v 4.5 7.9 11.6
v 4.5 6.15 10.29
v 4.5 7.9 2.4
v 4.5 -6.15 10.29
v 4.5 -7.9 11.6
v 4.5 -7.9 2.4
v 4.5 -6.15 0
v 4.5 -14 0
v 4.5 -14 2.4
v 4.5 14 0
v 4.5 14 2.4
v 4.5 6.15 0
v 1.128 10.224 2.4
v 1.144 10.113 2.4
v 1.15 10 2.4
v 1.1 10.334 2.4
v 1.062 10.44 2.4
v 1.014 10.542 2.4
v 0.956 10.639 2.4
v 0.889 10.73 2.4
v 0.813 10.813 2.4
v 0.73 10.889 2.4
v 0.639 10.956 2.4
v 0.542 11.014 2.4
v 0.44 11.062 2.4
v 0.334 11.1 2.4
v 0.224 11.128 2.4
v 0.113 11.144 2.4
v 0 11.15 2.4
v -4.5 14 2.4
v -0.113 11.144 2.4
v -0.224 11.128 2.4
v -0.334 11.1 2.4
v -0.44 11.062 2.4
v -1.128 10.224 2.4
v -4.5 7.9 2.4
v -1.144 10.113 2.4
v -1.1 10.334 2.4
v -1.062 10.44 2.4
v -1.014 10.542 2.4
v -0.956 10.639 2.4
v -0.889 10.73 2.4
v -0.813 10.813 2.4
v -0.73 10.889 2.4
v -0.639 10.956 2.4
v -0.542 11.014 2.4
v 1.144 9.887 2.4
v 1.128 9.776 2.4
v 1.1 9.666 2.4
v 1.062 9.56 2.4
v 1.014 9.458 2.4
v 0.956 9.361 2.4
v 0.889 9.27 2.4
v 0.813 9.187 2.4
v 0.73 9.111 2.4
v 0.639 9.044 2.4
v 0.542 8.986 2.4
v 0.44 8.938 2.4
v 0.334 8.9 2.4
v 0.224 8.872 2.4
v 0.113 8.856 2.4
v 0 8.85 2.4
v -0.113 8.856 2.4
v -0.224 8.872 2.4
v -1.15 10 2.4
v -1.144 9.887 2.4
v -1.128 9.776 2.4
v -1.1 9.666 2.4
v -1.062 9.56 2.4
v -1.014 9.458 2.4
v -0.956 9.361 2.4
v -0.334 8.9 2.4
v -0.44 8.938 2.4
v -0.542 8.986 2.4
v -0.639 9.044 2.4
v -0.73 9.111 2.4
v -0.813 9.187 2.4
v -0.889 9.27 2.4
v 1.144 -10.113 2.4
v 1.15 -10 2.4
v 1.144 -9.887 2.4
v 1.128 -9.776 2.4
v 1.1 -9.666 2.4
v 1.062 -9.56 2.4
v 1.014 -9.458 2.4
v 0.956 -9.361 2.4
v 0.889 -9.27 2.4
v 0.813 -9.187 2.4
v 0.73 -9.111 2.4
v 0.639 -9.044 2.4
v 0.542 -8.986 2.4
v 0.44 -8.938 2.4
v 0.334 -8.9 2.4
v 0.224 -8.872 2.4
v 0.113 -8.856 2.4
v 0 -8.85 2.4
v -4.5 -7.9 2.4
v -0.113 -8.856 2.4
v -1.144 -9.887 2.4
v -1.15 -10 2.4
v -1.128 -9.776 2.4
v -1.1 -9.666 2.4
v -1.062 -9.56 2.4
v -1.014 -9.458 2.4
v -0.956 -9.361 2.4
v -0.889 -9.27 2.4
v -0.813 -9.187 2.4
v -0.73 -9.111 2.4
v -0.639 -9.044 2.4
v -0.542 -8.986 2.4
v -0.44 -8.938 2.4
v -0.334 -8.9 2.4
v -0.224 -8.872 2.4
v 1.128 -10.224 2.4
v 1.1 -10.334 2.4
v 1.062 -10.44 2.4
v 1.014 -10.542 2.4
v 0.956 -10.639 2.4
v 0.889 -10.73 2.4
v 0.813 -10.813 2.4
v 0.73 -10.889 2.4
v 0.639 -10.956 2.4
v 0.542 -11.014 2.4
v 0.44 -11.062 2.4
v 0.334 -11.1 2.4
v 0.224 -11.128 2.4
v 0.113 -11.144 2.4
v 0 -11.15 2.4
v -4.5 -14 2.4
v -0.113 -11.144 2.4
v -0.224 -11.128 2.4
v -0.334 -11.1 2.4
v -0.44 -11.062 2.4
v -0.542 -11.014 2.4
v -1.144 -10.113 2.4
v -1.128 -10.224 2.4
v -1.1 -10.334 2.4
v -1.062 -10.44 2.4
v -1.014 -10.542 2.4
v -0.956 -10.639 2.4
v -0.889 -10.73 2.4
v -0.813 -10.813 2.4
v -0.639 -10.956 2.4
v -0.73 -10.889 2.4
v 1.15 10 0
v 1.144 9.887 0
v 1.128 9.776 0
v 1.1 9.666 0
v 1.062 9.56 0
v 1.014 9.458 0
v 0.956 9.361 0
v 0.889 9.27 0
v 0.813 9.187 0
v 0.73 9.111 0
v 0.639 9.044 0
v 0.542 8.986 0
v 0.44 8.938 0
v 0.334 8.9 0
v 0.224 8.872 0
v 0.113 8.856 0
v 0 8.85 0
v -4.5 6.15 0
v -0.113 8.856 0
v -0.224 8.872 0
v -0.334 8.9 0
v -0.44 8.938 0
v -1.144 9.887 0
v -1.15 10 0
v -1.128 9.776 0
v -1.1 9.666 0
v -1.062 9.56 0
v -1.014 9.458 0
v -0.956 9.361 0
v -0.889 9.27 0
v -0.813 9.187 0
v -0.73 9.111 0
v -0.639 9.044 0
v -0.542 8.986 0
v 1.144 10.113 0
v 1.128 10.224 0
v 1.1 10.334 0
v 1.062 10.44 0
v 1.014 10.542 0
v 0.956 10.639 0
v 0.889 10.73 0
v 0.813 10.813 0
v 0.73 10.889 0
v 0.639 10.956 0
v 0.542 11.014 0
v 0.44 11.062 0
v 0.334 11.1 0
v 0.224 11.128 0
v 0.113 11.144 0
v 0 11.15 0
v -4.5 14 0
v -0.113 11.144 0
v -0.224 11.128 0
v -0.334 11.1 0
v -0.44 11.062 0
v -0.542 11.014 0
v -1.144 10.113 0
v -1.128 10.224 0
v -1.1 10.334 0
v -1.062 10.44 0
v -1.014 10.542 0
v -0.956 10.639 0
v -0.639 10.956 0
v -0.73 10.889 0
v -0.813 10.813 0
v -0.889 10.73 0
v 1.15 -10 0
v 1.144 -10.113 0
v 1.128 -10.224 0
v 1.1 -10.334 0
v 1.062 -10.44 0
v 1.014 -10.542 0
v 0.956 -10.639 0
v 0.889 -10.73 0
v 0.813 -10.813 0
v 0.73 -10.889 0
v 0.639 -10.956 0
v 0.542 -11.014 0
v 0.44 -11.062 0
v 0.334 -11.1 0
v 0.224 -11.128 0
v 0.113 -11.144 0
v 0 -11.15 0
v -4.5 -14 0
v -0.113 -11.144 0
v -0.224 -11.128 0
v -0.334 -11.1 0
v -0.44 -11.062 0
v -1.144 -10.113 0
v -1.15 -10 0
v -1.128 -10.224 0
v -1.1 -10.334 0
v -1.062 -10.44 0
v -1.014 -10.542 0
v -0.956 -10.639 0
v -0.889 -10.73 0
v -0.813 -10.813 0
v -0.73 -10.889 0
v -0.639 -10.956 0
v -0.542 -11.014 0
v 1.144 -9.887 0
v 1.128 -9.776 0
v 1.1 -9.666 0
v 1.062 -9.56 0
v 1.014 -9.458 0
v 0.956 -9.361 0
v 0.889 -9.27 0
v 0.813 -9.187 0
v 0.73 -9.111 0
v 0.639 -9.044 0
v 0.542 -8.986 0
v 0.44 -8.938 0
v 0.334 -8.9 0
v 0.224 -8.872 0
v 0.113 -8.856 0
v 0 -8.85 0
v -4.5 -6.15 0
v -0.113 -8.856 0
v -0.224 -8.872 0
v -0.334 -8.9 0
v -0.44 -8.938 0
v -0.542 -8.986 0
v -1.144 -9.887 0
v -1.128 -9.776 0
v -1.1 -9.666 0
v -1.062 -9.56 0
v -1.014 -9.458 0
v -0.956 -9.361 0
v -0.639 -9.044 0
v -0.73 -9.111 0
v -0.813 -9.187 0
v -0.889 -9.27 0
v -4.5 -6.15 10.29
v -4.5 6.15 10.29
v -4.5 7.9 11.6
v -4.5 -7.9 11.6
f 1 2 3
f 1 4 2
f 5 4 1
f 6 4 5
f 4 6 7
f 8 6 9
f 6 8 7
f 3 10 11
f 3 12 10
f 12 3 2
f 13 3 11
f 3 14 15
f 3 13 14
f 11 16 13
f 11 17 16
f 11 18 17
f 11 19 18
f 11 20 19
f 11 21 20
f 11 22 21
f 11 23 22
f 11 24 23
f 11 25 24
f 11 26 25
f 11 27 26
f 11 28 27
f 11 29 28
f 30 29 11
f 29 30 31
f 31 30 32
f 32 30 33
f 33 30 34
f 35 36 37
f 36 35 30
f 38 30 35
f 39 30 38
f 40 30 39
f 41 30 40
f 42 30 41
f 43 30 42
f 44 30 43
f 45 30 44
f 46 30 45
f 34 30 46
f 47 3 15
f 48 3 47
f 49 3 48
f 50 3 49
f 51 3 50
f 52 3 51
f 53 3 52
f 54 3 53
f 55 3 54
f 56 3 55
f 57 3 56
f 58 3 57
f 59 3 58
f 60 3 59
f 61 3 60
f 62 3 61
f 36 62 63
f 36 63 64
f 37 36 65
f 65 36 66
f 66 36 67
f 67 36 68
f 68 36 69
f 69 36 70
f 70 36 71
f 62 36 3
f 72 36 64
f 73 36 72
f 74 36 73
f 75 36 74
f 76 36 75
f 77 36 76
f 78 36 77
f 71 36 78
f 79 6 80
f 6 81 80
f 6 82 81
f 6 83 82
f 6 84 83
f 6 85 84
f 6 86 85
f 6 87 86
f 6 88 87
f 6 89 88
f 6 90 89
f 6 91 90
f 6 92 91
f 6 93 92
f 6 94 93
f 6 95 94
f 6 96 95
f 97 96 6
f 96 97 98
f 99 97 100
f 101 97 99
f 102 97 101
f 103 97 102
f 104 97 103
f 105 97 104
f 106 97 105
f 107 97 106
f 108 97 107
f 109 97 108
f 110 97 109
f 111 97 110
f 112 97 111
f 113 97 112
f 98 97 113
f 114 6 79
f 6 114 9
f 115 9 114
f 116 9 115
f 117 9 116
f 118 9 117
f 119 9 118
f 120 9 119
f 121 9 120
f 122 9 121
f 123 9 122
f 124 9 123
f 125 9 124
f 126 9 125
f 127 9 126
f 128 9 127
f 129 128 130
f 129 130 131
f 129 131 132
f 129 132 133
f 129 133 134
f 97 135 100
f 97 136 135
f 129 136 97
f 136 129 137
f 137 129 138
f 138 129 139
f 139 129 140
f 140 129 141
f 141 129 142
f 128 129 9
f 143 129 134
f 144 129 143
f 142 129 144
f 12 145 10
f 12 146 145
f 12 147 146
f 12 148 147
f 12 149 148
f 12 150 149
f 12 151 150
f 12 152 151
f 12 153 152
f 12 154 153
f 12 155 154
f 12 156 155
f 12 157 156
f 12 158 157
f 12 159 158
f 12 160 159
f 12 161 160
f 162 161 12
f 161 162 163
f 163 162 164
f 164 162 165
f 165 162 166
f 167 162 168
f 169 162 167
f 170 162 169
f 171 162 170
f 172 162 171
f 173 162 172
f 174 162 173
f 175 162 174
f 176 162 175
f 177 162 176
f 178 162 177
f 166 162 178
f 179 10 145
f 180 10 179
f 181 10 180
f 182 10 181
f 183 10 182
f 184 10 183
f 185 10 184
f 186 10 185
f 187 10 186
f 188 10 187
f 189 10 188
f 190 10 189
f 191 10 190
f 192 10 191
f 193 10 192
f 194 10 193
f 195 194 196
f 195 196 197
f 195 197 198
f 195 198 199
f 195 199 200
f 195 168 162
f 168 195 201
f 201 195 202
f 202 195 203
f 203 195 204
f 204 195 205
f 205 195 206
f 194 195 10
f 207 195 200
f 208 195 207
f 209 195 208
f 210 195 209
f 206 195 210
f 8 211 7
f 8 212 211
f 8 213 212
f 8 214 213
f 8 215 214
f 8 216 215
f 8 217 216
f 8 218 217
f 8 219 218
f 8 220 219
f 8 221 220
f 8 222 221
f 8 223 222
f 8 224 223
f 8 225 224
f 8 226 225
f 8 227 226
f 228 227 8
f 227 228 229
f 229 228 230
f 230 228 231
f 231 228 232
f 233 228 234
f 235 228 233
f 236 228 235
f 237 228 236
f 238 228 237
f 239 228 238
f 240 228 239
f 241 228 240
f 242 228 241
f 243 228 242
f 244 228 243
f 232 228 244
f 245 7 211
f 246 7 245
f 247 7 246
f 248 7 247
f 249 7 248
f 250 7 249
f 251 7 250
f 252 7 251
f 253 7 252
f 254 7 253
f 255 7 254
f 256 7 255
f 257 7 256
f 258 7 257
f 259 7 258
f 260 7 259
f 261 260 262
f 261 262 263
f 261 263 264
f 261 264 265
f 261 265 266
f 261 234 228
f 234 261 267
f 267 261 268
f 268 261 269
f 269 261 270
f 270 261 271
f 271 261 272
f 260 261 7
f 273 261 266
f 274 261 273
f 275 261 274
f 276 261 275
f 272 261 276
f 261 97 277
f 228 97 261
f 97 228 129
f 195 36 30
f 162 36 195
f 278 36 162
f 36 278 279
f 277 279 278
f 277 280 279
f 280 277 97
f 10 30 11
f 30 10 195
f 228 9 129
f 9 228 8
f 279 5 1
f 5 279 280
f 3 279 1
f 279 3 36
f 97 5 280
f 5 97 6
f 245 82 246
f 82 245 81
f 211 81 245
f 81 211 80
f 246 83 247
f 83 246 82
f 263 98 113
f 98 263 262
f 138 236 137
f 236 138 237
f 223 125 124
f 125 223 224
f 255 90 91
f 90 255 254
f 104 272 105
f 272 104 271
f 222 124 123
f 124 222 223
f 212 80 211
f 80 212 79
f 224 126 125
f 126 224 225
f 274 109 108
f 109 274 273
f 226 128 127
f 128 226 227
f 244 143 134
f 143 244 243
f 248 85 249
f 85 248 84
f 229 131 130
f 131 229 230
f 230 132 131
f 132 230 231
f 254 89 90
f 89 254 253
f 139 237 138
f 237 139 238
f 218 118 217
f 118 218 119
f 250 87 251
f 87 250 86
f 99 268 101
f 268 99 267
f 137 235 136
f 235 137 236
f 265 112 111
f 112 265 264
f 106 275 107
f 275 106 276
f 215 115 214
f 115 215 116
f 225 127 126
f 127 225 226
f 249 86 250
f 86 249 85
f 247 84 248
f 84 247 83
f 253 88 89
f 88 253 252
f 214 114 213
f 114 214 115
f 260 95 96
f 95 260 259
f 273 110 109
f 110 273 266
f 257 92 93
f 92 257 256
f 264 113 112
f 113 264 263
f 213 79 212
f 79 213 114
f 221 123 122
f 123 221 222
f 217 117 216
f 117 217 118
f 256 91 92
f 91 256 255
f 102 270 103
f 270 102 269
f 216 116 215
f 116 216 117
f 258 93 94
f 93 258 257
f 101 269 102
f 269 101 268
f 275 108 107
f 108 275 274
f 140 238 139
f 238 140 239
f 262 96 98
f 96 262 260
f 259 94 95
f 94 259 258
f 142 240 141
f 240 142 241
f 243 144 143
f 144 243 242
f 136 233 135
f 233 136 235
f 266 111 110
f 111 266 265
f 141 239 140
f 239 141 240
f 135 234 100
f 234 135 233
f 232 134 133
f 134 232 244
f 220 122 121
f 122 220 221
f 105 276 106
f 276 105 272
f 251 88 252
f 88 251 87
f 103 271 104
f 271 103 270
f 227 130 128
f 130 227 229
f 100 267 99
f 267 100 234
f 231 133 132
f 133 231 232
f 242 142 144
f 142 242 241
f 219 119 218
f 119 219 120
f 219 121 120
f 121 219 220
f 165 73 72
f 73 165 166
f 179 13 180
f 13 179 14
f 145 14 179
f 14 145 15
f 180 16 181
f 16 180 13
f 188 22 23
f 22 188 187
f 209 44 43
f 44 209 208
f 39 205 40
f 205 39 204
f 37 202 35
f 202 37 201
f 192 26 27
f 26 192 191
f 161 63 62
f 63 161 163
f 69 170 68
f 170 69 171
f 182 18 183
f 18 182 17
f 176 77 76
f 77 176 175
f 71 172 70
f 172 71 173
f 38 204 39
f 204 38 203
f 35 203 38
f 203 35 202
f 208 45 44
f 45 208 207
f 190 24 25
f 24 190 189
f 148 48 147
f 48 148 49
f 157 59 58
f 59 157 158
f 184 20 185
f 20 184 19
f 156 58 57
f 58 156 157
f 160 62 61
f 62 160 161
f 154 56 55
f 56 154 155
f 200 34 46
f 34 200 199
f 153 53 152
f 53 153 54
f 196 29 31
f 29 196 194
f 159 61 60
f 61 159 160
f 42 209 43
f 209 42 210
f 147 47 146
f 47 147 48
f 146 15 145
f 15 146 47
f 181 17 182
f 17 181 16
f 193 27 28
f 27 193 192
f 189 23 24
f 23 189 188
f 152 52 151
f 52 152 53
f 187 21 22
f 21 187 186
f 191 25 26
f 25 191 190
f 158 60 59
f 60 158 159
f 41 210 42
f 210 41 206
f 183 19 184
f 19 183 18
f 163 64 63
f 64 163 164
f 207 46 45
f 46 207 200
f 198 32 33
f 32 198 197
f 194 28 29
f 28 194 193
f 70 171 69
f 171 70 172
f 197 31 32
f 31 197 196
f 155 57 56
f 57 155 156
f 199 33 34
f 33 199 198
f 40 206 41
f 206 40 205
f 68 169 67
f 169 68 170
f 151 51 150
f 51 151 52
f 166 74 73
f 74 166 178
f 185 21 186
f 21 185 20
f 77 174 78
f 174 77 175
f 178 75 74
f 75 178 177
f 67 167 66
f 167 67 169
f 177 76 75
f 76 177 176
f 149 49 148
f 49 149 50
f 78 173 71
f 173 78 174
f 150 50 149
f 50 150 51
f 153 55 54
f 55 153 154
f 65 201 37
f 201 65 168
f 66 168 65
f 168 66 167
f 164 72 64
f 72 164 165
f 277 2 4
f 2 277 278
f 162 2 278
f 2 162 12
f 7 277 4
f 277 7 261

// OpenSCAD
// PROVISIONAL FIT STUDY — dimensions in mm. Not validated for assembly.
// Select a part, render with F6, export STL after measured fit approval.
part = "motor_clamp"; // motor_clamp, battery_cradle, camera_bracket
$fn=64;
fit=0.3;
motor_width=12; motor_height=10; // motor roll orientation must be measured
clamp_axial_length=9;
clamp_hole_pitch=20; // actual PCB paired M2 holes, tangential spacing
motor_center_above_pcb=5; // provisional: terminal height is NOT established
pcb_thickness=1.6;
bolt_clearance=2.3;
battery=[62,34,6]; // ASSUMED PHB1S100020CJST envelope; measure actual 20C pack
battery_side_clearance=1; // each side; includes liner/fit allowance
battery_top_allowance=2; // retain free height; straps must not compress pouch
tray_inside=[battery[0]+2*battery_side_clearance,battery[1]+2*battery_side_clearance,battery[2]+battery_top_allowance];
wall=1.6; floor=1.6;
camera_board=[32,32,2]; // PLACEHOLDER: measure exact Waveshare PCB
camera_lens_diameter=14; // PLACEHOLDER: measure optical barrel

module motor_clamp(){
 // Saddle centered at radius 34 mm; ears align with existing PCB holes.
 // M2 through-bolts with washers and metal nuts below PCB; length selected
 // after motor vertical datum is measured. No reliance on solder for load.
 difference(){
  union(){
   translate([-clamp_axial_length/2,-14,0])cube([clamp_axial_length,28,2.4]);
   translate([-clamp_axial_length/2,-(motor_width/2+wall+fit),0])
    cube([clamp_axial_length,motor_width+2*(wall+fit),motor_center_above_pcb+motor_height/2+wall]);
  }
  translate([-clamp_axial_length,-(motor_width+fit)/2,-.01])
   cube([2*clamp_axial_length,motor_width+fit,motor_center_above_pcb+motor_height/2+fit]);
  for(y=[-clamp_hole_pitch/2,clamp_hole_pitch/2])
   translate([0,y,-.1])cylinder(h=20,d=bolt_clearance);
 }
}
module battery_cradle(){
 // Bottom tray with open ends, soft liner and two hook-and-loop straps.
 // Floating study: attachment to accessory holes is not yet collision checked.
 difference(){
  union(){
   cube([tray_inside[0]+2*wall,tray_inside[1]+2*wall,floor]);
   for(y=[0,tray_inside[1]+wall])translate([0,y,0])
    cube([tray_inside[0]+2*wall,wall,6]);
  }
  for(x=[10,tray_inside[0]-6])for(y=[3,tray_inside[1]-1])
   translate([x,y,-.1])cube([6,2.5,floor+.2]);
 }
}
module camera_bracket(){
 // Slotted universal backplate. M2 standoffs require actual hole pattern.
 // Lens window is a clearance study, not a verified field-of-view aperture.
 difference(){
  union(){cube([40,16,2.4]);translate([0,13.6,0])cube([40,2.4,40]);}
  for(x=[7,33])hull(){
   translate([x,5,-.1])cylinder(h=3,d=bolt_clearance);
   translate([x,10,-.1])cylinder(h=3,d=bolt_clearance);
  }
  translate([20,17,23])rotate([90,0,0])cylinder(h=5,d=camera_lens_diameter+2);
  for(x=[6,34])for(z=[10,34])hull(){
   translate([x,17,z-2])rotate([90,0,0])cylinder(h=5,d=bolt_clearance);
   translate([x,17,z+2])rotate([90,0,0])cylinder(h=5,d=bolt_clearance);
  }
 }
}
if(part=="motor_clamp")motor_clamp();
else if(part=="battery_cradle")battery_cradle();
else if(part=="camera_bracket")camera_bracket();
